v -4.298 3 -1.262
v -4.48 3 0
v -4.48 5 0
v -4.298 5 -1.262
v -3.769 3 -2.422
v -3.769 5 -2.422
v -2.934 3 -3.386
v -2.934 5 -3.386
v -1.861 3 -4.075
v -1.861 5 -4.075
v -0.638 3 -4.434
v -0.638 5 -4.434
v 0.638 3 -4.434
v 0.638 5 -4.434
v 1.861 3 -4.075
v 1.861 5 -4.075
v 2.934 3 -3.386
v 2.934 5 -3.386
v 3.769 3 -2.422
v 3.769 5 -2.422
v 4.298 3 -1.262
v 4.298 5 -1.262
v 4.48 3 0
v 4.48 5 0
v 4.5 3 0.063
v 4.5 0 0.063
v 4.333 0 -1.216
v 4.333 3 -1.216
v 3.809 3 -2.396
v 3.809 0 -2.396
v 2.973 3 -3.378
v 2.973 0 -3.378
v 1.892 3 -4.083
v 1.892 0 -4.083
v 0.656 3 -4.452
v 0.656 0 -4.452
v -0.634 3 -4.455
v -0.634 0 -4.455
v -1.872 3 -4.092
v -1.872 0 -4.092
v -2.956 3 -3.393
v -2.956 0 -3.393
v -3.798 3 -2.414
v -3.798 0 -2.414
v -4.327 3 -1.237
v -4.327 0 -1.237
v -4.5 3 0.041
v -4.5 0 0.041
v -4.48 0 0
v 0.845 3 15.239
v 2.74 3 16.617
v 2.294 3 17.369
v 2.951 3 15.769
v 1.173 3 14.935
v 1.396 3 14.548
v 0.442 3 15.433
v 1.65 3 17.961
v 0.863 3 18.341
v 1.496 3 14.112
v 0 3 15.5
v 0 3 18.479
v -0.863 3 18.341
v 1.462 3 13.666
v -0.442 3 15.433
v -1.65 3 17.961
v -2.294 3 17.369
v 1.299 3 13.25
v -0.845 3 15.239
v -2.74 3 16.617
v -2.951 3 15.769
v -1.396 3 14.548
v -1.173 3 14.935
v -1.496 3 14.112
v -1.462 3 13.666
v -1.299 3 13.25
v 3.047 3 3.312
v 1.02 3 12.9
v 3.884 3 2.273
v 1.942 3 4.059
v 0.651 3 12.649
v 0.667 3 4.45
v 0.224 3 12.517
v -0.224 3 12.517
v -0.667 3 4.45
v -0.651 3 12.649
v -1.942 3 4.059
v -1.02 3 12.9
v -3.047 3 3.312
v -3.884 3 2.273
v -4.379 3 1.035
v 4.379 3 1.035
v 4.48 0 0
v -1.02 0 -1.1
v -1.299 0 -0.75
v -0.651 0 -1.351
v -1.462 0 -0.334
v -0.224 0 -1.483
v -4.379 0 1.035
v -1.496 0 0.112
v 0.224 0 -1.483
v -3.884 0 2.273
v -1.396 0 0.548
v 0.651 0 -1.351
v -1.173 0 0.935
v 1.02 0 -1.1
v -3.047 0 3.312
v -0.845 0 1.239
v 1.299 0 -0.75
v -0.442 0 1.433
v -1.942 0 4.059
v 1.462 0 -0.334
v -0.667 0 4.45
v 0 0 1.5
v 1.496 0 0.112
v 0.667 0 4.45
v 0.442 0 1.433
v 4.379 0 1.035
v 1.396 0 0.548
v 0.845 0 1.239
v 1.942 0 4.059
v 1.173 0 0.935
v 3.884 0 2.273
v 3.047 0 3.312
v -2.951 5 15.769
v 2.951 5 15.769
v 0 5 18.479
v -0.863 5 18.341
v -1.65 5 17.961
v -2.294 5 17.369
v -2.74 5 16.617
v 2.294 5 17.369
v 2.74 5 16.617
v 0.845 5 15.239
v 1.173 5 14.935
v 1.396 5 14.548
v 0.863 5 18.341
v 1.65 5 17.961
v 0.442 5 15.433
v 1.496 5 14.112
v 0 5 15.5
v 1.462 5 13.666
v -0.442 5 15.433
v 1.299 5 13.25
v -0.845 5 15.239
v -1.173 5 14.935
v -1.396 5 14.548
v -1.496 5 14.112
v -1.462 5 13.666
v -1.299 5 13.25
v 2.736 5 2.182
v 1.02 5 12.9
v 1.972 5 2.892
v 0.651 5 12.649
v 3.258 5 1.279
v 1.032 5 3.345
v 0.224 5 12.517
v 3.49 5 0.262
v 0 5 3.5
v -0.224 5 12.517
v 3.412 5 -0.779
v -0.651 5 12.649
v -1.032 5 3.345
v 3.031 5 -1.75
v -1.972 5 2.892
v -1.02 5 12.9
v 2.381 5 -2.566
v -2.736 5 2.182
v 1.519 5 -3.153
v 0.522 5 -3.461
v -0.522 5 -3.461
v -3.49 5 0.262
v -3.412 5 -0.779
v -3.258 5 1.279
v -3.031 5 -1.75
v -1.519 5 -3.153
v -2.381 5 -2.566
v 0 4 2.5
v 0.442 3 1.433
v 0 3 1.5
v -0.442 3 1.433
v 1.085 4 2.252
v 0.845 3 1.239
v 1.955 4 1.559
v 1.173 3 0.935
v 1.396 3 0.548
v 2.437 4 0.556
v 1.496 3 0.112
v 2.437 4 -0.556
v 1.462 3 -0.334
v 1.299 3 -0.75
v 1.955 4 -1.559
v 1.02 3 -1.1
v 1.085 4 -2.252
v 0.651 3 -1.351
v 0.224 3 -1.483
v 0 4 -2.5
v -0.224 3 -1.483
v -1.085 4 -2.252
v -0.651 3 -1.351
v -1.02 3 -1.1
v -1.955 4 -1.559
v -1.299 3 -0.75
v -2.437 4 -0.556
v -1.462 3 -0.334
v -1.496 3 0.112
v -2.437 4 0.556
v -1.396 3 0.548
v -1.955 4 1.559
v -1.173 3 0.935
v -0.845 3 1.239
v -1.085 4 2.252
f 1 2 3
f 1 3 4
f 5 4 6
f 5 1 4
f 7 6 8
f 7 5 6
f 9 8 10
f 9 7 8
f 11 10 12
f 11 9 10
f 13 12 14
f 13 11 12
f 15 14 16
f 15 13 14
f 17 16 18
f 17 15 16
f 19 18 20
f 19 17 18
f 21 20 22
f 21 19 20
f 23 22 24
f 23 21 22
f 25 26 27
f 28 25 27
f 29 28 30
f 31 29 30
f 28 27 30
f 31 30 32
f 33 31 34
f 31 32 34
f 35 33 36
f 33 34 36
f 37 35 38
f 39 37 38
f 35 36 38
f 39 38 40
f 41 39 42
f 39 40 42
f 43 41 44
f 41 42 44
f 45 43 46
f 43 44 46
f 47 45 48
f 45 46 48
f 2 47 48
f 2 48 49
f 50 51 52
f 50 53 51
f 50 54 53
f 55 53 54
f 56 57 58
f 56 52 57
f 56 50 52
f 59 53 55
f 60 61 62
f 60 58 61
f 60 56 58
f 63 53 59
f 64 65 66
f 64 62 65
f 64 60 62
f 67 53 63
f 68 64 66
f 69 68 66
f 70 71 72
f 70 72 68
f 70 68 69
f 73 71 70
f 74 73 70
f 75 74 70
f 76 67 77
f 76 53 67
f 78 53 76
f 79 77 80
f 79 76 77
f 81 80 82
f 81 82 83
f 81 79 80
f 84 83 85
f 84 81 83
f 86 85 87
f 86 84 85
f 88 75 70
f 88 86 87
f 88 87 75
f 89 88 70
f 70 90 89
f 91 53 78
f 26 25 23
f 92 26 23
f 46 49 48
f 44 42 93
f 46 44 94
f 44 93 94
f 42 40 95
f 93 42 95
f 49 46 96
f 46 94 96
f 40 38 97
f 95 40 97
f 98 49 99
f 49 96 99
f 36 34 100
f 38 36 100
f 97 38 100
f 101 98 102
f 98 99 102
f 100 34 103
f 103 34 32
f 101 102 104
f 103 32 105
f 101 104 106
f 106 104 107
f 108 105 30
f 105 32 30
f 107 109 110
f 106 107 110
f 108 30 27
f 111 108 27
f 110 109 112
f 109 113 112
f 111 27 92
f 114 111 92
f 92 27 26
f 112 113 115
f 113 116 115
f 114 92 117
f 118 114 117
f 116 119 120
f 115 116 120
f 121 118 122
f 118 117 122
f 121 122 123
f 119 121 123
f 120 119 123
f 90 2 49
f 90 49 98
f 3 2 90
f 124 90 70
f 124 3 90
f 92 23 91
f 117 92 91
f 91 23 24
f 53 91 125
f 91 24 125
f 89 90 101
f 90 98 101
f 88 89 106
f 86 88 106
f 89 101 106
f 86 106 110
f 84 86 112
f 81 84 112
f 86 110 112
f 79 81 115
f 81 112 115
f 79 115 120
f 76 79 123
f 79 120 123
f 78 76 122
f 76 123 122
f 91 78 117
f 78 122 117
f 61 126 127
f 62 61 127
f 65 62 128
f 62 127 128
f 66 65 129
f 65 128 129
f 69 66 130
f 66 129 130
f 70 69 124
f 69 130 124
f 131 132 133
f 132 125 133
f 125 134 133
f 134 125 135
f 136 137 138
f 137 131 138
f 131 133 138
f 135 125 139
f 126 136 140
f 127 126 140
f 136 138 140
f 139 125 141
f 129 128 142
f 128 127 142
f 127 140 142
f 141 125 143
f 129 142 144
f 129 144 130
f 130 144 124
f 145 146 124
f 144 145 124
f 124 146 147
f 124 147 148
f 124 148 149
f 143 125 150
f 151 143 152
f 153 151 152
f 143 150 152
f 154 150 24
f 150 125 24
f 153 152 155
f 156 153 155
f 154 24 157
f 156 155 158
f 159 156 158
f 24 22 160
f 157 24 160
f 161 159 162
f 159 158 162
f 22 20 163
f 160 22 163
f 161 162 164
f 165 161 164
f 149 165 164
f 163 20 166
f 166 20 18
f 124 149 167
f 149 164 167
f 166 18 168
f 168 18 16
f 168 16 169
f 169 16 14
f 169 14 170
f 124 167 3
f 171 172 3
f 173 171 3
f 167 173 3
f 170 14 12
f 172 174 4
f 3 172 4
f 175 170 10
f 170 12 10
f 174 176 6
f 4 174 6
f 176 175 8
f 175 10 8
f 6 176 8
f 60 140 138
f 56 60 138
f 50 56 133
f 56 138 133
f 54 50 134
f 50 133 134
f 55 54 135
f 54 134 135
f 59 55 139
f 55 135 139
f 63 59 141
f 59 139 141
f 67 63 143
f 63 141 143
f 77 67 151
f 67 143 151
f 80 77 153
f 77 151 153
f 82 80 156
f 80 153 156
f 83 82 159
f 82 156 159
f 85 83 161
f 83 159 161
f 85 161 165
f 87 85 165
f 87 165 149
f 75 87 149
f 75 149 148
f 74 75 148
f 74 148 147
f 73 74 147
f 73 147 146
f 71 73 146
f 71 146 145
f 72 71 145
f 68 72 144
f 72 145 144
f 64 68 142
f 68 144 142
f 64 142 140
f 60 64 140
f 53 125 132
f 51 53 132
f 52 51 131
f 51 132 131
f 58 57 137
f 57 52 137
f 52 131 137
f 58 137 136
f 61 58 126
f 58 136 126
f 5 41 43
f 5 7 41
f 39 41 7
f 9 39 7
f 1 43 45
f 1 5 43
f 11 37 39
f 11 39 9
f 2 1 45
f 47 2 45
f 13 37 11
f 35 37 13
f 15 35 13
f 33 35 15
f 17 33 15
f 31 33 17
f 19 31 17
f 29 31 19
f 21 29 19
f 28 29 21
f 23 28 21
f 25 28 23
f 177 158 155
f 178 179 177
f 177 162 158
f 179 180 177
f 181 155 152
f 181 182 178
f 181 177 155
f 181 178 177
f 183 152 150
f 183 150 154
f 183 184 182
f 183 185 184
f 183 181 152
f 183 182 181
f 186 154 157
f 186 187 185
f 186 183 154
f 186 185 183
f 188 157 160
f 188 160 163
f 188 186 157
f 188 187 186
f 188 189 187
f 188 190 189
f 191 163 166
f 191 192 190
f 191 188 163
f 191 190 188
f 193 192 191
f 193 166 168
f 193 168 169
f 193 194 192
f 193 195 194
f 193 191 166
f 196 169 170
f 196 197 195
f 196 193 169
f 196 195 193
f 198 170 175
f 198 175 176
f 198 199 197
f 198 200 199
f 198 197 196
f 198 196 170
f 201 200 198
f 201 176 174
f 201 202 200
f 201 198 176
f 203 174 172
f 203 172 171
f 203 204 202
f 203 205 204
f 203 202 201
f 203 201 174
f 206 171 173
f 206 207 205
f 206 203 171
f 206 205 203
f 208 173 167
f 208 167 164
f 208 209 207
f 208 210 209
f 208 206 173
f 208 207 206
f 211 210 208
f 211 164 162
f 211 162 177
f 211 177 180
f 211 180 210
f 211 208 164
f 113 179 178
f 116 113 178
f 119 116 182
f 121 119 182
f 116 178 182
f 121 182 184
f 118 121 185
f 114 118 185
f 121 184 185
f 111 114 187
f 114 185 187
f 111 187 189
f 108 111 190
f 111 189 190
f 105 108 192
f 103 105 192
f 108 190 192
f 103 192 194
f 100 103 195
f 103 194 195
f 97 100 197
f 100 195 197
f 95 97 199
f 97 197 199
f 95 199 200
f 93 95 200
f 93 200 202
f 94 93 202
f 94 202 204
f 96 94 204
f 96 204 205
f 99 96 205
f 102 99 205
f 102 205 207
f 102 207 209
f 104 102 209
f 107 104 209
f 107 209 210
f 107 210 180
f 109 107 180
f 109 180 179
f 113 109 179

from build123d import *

# Parameters (mm, degrees)
SKETCH1_R           = 4.5
BOSS_EXTRUDE1_DEPTH = 3
BOSS_EXTRUDE2_DEPTH = 2
SKETCH3_R           = 1
CUT_EXTRUDE1_DEPTH  = 2
SKETCH4_R           = 1.5
CUT_EXTRUDE3_DEPTH  = 32
CHAMFER1_SIZE       = 2
CUT_EXTRUDE4_DEPTH  = 32
FILLET1_R           = 3
SKETCH6_R           = 1.5
CUT_EXTRUDE5_DEPTH  = 2


with BuildPart() as part:
    # Sketch1 → Boss-Extrude1 (new body)
    with BuildSketch(Plane(origin=(0, 0, 0), x_dir=(1, 0, 0), z_dir=(0, 1, 0))):
        with Locations(Location((0, 0, 0), (0, 0, 270))):
            Circle(SKETCH1_R)
    extrude(amount=BOSS_EXTRUDE1_DEPTH)

    # Sketch2 → Boss-Extrude2 (add)
    with BuildSketch(Plane(origin=(0, 3, 0), x_dir=(1, 0, 0), z_dir=(0, 1, 0))):
        with BuildLine():
            Line((4.479718811, 0), (4.479718811, -14))
            ThreePointArc((4.479718811, -14), (0, -18.479718811), (-4.479718811, -14))
            Line((-4.479718811, -14), (-4.479718811, 0))
            ThreePointArc((-4.479718811, 0), (0, 4.479718811), (4.479718811, 0))
        make_face()
    extrude(amount=BOSS_EXTRUDE2_DEPTH)

    # Sketch3 → Cut-Extrude1 (cut)
    with BuildSketch(Plane(origin=(0, 5, 0), x_dir=(1, 0, 0), z_dir=(0, 1, 0))):
        with Locations(Location((0, -14, 0), (0, 0, 270))):
            Circle(SKETCH3_R)
    extrude(amount=-CUT_EXTRUDE1_DEPTH, mode=Mode.SUBTRACT)

    # Sketch4 → Cut-Extrude3 (cut)
    with BuildSketch(Plane(origin=(0, 5, 0), x_dir=(1, 0, 0), z_dir=(0, 1, 0))):
        with Locations(Location((0, 0, 0), (0, 0, 270))):
            Circle(SKETCH4_R)
    extrude(amount=-CUT_EXTRUDE3_DEPTH, mode=Mode.SUBTRACT)

    # Chamfer1
    chamfer1_edges = [part.edges().sort_by_distance(p)[0] for p in [
        (0, 5, -1.5),
    ]]
    chamfer(chamfer1_edges, length=CHAMFER1_SIZE)

    # Sketch5 → Cut-Extrude4 (cut)
    with BuildSketch(Plane(origin=(0, 5, 0), x_dir=(1, 0, 0), z_dir=(0, 1, 0))):
        Polygon((4.479718811, 0), (2.781543996, -17.511537216), (5.759954013, -17.140136672), (7.823781183, -10.648462117), align=None)
        Polygon((-4.479718811, 0), (-2.781543996, -17.511537216), (-11.97019759, -15.320216349), align=None)
    extrude(amount=-CUT_EXTRUDE4_DEPTH, mode=Mode.SUBTRACT)

    # Fillet1
    # the kernel refuses this fillet: 3 mm, written as the material it takes off along each edge
    with BuildSketch(Plane(origin=(-2.781543996, 12.615972723, 17.511537216), x_dir=(0.9482948551929795, 0, 0.31739071759351406), z_dir=(0, -1, 0))) as fillet1_piece_1:
        with BuildLine():
            CenterArc((2.026328718, -2.82125448), FILLET1_R, 70.121899875, 85.833982954)
            Line((-0.713367294, -1.59893465), (0, 0))
            ThreePointArc((0, 0), (1.523194545, 0.26690989), (3.046389089, 0))
        make_face()
    extrude(amount=17.231945445, mode=Mode.SUBTRACT)
    with BuildSketch(Plane(origin=(2.781543996, 12.615972723, 17.511537216), x_dir=(-0.9482948551929786, 0, 0.3173907175935166), z_dir=(0, -1, 0))) as fillet1_piece_2:
        with BuildLine():
            CenterArc((2.026328718, 2.82125448), FILLET1_R, 204.044117171, 85.833982954)
            Line((-0.713367294, 1.59893465), (0, 0))
            ThreePointArc((0, 0), (1.523194545, -0.26690989), (3.046389089, 0))
        make_face()
    extrude(amount=17.231945445, mode=Mode.SUBTRACT)

    # Sketch6 → Cut-Extrude5 (cut)
    with BuildSketch(Plane(origin=(0, 5, 0), x_dir=(1, 0, 0), z_dir=(0, 1, 0))):
        with Locations(Location((0, -14, 0), (0, 0, 270))):
            Circle(SKETCH6_R)
    extrude(amount=-CUT_EXTRUDE5_DEPTH, mode=Mode.SUBTRACT)


solid = part.part
